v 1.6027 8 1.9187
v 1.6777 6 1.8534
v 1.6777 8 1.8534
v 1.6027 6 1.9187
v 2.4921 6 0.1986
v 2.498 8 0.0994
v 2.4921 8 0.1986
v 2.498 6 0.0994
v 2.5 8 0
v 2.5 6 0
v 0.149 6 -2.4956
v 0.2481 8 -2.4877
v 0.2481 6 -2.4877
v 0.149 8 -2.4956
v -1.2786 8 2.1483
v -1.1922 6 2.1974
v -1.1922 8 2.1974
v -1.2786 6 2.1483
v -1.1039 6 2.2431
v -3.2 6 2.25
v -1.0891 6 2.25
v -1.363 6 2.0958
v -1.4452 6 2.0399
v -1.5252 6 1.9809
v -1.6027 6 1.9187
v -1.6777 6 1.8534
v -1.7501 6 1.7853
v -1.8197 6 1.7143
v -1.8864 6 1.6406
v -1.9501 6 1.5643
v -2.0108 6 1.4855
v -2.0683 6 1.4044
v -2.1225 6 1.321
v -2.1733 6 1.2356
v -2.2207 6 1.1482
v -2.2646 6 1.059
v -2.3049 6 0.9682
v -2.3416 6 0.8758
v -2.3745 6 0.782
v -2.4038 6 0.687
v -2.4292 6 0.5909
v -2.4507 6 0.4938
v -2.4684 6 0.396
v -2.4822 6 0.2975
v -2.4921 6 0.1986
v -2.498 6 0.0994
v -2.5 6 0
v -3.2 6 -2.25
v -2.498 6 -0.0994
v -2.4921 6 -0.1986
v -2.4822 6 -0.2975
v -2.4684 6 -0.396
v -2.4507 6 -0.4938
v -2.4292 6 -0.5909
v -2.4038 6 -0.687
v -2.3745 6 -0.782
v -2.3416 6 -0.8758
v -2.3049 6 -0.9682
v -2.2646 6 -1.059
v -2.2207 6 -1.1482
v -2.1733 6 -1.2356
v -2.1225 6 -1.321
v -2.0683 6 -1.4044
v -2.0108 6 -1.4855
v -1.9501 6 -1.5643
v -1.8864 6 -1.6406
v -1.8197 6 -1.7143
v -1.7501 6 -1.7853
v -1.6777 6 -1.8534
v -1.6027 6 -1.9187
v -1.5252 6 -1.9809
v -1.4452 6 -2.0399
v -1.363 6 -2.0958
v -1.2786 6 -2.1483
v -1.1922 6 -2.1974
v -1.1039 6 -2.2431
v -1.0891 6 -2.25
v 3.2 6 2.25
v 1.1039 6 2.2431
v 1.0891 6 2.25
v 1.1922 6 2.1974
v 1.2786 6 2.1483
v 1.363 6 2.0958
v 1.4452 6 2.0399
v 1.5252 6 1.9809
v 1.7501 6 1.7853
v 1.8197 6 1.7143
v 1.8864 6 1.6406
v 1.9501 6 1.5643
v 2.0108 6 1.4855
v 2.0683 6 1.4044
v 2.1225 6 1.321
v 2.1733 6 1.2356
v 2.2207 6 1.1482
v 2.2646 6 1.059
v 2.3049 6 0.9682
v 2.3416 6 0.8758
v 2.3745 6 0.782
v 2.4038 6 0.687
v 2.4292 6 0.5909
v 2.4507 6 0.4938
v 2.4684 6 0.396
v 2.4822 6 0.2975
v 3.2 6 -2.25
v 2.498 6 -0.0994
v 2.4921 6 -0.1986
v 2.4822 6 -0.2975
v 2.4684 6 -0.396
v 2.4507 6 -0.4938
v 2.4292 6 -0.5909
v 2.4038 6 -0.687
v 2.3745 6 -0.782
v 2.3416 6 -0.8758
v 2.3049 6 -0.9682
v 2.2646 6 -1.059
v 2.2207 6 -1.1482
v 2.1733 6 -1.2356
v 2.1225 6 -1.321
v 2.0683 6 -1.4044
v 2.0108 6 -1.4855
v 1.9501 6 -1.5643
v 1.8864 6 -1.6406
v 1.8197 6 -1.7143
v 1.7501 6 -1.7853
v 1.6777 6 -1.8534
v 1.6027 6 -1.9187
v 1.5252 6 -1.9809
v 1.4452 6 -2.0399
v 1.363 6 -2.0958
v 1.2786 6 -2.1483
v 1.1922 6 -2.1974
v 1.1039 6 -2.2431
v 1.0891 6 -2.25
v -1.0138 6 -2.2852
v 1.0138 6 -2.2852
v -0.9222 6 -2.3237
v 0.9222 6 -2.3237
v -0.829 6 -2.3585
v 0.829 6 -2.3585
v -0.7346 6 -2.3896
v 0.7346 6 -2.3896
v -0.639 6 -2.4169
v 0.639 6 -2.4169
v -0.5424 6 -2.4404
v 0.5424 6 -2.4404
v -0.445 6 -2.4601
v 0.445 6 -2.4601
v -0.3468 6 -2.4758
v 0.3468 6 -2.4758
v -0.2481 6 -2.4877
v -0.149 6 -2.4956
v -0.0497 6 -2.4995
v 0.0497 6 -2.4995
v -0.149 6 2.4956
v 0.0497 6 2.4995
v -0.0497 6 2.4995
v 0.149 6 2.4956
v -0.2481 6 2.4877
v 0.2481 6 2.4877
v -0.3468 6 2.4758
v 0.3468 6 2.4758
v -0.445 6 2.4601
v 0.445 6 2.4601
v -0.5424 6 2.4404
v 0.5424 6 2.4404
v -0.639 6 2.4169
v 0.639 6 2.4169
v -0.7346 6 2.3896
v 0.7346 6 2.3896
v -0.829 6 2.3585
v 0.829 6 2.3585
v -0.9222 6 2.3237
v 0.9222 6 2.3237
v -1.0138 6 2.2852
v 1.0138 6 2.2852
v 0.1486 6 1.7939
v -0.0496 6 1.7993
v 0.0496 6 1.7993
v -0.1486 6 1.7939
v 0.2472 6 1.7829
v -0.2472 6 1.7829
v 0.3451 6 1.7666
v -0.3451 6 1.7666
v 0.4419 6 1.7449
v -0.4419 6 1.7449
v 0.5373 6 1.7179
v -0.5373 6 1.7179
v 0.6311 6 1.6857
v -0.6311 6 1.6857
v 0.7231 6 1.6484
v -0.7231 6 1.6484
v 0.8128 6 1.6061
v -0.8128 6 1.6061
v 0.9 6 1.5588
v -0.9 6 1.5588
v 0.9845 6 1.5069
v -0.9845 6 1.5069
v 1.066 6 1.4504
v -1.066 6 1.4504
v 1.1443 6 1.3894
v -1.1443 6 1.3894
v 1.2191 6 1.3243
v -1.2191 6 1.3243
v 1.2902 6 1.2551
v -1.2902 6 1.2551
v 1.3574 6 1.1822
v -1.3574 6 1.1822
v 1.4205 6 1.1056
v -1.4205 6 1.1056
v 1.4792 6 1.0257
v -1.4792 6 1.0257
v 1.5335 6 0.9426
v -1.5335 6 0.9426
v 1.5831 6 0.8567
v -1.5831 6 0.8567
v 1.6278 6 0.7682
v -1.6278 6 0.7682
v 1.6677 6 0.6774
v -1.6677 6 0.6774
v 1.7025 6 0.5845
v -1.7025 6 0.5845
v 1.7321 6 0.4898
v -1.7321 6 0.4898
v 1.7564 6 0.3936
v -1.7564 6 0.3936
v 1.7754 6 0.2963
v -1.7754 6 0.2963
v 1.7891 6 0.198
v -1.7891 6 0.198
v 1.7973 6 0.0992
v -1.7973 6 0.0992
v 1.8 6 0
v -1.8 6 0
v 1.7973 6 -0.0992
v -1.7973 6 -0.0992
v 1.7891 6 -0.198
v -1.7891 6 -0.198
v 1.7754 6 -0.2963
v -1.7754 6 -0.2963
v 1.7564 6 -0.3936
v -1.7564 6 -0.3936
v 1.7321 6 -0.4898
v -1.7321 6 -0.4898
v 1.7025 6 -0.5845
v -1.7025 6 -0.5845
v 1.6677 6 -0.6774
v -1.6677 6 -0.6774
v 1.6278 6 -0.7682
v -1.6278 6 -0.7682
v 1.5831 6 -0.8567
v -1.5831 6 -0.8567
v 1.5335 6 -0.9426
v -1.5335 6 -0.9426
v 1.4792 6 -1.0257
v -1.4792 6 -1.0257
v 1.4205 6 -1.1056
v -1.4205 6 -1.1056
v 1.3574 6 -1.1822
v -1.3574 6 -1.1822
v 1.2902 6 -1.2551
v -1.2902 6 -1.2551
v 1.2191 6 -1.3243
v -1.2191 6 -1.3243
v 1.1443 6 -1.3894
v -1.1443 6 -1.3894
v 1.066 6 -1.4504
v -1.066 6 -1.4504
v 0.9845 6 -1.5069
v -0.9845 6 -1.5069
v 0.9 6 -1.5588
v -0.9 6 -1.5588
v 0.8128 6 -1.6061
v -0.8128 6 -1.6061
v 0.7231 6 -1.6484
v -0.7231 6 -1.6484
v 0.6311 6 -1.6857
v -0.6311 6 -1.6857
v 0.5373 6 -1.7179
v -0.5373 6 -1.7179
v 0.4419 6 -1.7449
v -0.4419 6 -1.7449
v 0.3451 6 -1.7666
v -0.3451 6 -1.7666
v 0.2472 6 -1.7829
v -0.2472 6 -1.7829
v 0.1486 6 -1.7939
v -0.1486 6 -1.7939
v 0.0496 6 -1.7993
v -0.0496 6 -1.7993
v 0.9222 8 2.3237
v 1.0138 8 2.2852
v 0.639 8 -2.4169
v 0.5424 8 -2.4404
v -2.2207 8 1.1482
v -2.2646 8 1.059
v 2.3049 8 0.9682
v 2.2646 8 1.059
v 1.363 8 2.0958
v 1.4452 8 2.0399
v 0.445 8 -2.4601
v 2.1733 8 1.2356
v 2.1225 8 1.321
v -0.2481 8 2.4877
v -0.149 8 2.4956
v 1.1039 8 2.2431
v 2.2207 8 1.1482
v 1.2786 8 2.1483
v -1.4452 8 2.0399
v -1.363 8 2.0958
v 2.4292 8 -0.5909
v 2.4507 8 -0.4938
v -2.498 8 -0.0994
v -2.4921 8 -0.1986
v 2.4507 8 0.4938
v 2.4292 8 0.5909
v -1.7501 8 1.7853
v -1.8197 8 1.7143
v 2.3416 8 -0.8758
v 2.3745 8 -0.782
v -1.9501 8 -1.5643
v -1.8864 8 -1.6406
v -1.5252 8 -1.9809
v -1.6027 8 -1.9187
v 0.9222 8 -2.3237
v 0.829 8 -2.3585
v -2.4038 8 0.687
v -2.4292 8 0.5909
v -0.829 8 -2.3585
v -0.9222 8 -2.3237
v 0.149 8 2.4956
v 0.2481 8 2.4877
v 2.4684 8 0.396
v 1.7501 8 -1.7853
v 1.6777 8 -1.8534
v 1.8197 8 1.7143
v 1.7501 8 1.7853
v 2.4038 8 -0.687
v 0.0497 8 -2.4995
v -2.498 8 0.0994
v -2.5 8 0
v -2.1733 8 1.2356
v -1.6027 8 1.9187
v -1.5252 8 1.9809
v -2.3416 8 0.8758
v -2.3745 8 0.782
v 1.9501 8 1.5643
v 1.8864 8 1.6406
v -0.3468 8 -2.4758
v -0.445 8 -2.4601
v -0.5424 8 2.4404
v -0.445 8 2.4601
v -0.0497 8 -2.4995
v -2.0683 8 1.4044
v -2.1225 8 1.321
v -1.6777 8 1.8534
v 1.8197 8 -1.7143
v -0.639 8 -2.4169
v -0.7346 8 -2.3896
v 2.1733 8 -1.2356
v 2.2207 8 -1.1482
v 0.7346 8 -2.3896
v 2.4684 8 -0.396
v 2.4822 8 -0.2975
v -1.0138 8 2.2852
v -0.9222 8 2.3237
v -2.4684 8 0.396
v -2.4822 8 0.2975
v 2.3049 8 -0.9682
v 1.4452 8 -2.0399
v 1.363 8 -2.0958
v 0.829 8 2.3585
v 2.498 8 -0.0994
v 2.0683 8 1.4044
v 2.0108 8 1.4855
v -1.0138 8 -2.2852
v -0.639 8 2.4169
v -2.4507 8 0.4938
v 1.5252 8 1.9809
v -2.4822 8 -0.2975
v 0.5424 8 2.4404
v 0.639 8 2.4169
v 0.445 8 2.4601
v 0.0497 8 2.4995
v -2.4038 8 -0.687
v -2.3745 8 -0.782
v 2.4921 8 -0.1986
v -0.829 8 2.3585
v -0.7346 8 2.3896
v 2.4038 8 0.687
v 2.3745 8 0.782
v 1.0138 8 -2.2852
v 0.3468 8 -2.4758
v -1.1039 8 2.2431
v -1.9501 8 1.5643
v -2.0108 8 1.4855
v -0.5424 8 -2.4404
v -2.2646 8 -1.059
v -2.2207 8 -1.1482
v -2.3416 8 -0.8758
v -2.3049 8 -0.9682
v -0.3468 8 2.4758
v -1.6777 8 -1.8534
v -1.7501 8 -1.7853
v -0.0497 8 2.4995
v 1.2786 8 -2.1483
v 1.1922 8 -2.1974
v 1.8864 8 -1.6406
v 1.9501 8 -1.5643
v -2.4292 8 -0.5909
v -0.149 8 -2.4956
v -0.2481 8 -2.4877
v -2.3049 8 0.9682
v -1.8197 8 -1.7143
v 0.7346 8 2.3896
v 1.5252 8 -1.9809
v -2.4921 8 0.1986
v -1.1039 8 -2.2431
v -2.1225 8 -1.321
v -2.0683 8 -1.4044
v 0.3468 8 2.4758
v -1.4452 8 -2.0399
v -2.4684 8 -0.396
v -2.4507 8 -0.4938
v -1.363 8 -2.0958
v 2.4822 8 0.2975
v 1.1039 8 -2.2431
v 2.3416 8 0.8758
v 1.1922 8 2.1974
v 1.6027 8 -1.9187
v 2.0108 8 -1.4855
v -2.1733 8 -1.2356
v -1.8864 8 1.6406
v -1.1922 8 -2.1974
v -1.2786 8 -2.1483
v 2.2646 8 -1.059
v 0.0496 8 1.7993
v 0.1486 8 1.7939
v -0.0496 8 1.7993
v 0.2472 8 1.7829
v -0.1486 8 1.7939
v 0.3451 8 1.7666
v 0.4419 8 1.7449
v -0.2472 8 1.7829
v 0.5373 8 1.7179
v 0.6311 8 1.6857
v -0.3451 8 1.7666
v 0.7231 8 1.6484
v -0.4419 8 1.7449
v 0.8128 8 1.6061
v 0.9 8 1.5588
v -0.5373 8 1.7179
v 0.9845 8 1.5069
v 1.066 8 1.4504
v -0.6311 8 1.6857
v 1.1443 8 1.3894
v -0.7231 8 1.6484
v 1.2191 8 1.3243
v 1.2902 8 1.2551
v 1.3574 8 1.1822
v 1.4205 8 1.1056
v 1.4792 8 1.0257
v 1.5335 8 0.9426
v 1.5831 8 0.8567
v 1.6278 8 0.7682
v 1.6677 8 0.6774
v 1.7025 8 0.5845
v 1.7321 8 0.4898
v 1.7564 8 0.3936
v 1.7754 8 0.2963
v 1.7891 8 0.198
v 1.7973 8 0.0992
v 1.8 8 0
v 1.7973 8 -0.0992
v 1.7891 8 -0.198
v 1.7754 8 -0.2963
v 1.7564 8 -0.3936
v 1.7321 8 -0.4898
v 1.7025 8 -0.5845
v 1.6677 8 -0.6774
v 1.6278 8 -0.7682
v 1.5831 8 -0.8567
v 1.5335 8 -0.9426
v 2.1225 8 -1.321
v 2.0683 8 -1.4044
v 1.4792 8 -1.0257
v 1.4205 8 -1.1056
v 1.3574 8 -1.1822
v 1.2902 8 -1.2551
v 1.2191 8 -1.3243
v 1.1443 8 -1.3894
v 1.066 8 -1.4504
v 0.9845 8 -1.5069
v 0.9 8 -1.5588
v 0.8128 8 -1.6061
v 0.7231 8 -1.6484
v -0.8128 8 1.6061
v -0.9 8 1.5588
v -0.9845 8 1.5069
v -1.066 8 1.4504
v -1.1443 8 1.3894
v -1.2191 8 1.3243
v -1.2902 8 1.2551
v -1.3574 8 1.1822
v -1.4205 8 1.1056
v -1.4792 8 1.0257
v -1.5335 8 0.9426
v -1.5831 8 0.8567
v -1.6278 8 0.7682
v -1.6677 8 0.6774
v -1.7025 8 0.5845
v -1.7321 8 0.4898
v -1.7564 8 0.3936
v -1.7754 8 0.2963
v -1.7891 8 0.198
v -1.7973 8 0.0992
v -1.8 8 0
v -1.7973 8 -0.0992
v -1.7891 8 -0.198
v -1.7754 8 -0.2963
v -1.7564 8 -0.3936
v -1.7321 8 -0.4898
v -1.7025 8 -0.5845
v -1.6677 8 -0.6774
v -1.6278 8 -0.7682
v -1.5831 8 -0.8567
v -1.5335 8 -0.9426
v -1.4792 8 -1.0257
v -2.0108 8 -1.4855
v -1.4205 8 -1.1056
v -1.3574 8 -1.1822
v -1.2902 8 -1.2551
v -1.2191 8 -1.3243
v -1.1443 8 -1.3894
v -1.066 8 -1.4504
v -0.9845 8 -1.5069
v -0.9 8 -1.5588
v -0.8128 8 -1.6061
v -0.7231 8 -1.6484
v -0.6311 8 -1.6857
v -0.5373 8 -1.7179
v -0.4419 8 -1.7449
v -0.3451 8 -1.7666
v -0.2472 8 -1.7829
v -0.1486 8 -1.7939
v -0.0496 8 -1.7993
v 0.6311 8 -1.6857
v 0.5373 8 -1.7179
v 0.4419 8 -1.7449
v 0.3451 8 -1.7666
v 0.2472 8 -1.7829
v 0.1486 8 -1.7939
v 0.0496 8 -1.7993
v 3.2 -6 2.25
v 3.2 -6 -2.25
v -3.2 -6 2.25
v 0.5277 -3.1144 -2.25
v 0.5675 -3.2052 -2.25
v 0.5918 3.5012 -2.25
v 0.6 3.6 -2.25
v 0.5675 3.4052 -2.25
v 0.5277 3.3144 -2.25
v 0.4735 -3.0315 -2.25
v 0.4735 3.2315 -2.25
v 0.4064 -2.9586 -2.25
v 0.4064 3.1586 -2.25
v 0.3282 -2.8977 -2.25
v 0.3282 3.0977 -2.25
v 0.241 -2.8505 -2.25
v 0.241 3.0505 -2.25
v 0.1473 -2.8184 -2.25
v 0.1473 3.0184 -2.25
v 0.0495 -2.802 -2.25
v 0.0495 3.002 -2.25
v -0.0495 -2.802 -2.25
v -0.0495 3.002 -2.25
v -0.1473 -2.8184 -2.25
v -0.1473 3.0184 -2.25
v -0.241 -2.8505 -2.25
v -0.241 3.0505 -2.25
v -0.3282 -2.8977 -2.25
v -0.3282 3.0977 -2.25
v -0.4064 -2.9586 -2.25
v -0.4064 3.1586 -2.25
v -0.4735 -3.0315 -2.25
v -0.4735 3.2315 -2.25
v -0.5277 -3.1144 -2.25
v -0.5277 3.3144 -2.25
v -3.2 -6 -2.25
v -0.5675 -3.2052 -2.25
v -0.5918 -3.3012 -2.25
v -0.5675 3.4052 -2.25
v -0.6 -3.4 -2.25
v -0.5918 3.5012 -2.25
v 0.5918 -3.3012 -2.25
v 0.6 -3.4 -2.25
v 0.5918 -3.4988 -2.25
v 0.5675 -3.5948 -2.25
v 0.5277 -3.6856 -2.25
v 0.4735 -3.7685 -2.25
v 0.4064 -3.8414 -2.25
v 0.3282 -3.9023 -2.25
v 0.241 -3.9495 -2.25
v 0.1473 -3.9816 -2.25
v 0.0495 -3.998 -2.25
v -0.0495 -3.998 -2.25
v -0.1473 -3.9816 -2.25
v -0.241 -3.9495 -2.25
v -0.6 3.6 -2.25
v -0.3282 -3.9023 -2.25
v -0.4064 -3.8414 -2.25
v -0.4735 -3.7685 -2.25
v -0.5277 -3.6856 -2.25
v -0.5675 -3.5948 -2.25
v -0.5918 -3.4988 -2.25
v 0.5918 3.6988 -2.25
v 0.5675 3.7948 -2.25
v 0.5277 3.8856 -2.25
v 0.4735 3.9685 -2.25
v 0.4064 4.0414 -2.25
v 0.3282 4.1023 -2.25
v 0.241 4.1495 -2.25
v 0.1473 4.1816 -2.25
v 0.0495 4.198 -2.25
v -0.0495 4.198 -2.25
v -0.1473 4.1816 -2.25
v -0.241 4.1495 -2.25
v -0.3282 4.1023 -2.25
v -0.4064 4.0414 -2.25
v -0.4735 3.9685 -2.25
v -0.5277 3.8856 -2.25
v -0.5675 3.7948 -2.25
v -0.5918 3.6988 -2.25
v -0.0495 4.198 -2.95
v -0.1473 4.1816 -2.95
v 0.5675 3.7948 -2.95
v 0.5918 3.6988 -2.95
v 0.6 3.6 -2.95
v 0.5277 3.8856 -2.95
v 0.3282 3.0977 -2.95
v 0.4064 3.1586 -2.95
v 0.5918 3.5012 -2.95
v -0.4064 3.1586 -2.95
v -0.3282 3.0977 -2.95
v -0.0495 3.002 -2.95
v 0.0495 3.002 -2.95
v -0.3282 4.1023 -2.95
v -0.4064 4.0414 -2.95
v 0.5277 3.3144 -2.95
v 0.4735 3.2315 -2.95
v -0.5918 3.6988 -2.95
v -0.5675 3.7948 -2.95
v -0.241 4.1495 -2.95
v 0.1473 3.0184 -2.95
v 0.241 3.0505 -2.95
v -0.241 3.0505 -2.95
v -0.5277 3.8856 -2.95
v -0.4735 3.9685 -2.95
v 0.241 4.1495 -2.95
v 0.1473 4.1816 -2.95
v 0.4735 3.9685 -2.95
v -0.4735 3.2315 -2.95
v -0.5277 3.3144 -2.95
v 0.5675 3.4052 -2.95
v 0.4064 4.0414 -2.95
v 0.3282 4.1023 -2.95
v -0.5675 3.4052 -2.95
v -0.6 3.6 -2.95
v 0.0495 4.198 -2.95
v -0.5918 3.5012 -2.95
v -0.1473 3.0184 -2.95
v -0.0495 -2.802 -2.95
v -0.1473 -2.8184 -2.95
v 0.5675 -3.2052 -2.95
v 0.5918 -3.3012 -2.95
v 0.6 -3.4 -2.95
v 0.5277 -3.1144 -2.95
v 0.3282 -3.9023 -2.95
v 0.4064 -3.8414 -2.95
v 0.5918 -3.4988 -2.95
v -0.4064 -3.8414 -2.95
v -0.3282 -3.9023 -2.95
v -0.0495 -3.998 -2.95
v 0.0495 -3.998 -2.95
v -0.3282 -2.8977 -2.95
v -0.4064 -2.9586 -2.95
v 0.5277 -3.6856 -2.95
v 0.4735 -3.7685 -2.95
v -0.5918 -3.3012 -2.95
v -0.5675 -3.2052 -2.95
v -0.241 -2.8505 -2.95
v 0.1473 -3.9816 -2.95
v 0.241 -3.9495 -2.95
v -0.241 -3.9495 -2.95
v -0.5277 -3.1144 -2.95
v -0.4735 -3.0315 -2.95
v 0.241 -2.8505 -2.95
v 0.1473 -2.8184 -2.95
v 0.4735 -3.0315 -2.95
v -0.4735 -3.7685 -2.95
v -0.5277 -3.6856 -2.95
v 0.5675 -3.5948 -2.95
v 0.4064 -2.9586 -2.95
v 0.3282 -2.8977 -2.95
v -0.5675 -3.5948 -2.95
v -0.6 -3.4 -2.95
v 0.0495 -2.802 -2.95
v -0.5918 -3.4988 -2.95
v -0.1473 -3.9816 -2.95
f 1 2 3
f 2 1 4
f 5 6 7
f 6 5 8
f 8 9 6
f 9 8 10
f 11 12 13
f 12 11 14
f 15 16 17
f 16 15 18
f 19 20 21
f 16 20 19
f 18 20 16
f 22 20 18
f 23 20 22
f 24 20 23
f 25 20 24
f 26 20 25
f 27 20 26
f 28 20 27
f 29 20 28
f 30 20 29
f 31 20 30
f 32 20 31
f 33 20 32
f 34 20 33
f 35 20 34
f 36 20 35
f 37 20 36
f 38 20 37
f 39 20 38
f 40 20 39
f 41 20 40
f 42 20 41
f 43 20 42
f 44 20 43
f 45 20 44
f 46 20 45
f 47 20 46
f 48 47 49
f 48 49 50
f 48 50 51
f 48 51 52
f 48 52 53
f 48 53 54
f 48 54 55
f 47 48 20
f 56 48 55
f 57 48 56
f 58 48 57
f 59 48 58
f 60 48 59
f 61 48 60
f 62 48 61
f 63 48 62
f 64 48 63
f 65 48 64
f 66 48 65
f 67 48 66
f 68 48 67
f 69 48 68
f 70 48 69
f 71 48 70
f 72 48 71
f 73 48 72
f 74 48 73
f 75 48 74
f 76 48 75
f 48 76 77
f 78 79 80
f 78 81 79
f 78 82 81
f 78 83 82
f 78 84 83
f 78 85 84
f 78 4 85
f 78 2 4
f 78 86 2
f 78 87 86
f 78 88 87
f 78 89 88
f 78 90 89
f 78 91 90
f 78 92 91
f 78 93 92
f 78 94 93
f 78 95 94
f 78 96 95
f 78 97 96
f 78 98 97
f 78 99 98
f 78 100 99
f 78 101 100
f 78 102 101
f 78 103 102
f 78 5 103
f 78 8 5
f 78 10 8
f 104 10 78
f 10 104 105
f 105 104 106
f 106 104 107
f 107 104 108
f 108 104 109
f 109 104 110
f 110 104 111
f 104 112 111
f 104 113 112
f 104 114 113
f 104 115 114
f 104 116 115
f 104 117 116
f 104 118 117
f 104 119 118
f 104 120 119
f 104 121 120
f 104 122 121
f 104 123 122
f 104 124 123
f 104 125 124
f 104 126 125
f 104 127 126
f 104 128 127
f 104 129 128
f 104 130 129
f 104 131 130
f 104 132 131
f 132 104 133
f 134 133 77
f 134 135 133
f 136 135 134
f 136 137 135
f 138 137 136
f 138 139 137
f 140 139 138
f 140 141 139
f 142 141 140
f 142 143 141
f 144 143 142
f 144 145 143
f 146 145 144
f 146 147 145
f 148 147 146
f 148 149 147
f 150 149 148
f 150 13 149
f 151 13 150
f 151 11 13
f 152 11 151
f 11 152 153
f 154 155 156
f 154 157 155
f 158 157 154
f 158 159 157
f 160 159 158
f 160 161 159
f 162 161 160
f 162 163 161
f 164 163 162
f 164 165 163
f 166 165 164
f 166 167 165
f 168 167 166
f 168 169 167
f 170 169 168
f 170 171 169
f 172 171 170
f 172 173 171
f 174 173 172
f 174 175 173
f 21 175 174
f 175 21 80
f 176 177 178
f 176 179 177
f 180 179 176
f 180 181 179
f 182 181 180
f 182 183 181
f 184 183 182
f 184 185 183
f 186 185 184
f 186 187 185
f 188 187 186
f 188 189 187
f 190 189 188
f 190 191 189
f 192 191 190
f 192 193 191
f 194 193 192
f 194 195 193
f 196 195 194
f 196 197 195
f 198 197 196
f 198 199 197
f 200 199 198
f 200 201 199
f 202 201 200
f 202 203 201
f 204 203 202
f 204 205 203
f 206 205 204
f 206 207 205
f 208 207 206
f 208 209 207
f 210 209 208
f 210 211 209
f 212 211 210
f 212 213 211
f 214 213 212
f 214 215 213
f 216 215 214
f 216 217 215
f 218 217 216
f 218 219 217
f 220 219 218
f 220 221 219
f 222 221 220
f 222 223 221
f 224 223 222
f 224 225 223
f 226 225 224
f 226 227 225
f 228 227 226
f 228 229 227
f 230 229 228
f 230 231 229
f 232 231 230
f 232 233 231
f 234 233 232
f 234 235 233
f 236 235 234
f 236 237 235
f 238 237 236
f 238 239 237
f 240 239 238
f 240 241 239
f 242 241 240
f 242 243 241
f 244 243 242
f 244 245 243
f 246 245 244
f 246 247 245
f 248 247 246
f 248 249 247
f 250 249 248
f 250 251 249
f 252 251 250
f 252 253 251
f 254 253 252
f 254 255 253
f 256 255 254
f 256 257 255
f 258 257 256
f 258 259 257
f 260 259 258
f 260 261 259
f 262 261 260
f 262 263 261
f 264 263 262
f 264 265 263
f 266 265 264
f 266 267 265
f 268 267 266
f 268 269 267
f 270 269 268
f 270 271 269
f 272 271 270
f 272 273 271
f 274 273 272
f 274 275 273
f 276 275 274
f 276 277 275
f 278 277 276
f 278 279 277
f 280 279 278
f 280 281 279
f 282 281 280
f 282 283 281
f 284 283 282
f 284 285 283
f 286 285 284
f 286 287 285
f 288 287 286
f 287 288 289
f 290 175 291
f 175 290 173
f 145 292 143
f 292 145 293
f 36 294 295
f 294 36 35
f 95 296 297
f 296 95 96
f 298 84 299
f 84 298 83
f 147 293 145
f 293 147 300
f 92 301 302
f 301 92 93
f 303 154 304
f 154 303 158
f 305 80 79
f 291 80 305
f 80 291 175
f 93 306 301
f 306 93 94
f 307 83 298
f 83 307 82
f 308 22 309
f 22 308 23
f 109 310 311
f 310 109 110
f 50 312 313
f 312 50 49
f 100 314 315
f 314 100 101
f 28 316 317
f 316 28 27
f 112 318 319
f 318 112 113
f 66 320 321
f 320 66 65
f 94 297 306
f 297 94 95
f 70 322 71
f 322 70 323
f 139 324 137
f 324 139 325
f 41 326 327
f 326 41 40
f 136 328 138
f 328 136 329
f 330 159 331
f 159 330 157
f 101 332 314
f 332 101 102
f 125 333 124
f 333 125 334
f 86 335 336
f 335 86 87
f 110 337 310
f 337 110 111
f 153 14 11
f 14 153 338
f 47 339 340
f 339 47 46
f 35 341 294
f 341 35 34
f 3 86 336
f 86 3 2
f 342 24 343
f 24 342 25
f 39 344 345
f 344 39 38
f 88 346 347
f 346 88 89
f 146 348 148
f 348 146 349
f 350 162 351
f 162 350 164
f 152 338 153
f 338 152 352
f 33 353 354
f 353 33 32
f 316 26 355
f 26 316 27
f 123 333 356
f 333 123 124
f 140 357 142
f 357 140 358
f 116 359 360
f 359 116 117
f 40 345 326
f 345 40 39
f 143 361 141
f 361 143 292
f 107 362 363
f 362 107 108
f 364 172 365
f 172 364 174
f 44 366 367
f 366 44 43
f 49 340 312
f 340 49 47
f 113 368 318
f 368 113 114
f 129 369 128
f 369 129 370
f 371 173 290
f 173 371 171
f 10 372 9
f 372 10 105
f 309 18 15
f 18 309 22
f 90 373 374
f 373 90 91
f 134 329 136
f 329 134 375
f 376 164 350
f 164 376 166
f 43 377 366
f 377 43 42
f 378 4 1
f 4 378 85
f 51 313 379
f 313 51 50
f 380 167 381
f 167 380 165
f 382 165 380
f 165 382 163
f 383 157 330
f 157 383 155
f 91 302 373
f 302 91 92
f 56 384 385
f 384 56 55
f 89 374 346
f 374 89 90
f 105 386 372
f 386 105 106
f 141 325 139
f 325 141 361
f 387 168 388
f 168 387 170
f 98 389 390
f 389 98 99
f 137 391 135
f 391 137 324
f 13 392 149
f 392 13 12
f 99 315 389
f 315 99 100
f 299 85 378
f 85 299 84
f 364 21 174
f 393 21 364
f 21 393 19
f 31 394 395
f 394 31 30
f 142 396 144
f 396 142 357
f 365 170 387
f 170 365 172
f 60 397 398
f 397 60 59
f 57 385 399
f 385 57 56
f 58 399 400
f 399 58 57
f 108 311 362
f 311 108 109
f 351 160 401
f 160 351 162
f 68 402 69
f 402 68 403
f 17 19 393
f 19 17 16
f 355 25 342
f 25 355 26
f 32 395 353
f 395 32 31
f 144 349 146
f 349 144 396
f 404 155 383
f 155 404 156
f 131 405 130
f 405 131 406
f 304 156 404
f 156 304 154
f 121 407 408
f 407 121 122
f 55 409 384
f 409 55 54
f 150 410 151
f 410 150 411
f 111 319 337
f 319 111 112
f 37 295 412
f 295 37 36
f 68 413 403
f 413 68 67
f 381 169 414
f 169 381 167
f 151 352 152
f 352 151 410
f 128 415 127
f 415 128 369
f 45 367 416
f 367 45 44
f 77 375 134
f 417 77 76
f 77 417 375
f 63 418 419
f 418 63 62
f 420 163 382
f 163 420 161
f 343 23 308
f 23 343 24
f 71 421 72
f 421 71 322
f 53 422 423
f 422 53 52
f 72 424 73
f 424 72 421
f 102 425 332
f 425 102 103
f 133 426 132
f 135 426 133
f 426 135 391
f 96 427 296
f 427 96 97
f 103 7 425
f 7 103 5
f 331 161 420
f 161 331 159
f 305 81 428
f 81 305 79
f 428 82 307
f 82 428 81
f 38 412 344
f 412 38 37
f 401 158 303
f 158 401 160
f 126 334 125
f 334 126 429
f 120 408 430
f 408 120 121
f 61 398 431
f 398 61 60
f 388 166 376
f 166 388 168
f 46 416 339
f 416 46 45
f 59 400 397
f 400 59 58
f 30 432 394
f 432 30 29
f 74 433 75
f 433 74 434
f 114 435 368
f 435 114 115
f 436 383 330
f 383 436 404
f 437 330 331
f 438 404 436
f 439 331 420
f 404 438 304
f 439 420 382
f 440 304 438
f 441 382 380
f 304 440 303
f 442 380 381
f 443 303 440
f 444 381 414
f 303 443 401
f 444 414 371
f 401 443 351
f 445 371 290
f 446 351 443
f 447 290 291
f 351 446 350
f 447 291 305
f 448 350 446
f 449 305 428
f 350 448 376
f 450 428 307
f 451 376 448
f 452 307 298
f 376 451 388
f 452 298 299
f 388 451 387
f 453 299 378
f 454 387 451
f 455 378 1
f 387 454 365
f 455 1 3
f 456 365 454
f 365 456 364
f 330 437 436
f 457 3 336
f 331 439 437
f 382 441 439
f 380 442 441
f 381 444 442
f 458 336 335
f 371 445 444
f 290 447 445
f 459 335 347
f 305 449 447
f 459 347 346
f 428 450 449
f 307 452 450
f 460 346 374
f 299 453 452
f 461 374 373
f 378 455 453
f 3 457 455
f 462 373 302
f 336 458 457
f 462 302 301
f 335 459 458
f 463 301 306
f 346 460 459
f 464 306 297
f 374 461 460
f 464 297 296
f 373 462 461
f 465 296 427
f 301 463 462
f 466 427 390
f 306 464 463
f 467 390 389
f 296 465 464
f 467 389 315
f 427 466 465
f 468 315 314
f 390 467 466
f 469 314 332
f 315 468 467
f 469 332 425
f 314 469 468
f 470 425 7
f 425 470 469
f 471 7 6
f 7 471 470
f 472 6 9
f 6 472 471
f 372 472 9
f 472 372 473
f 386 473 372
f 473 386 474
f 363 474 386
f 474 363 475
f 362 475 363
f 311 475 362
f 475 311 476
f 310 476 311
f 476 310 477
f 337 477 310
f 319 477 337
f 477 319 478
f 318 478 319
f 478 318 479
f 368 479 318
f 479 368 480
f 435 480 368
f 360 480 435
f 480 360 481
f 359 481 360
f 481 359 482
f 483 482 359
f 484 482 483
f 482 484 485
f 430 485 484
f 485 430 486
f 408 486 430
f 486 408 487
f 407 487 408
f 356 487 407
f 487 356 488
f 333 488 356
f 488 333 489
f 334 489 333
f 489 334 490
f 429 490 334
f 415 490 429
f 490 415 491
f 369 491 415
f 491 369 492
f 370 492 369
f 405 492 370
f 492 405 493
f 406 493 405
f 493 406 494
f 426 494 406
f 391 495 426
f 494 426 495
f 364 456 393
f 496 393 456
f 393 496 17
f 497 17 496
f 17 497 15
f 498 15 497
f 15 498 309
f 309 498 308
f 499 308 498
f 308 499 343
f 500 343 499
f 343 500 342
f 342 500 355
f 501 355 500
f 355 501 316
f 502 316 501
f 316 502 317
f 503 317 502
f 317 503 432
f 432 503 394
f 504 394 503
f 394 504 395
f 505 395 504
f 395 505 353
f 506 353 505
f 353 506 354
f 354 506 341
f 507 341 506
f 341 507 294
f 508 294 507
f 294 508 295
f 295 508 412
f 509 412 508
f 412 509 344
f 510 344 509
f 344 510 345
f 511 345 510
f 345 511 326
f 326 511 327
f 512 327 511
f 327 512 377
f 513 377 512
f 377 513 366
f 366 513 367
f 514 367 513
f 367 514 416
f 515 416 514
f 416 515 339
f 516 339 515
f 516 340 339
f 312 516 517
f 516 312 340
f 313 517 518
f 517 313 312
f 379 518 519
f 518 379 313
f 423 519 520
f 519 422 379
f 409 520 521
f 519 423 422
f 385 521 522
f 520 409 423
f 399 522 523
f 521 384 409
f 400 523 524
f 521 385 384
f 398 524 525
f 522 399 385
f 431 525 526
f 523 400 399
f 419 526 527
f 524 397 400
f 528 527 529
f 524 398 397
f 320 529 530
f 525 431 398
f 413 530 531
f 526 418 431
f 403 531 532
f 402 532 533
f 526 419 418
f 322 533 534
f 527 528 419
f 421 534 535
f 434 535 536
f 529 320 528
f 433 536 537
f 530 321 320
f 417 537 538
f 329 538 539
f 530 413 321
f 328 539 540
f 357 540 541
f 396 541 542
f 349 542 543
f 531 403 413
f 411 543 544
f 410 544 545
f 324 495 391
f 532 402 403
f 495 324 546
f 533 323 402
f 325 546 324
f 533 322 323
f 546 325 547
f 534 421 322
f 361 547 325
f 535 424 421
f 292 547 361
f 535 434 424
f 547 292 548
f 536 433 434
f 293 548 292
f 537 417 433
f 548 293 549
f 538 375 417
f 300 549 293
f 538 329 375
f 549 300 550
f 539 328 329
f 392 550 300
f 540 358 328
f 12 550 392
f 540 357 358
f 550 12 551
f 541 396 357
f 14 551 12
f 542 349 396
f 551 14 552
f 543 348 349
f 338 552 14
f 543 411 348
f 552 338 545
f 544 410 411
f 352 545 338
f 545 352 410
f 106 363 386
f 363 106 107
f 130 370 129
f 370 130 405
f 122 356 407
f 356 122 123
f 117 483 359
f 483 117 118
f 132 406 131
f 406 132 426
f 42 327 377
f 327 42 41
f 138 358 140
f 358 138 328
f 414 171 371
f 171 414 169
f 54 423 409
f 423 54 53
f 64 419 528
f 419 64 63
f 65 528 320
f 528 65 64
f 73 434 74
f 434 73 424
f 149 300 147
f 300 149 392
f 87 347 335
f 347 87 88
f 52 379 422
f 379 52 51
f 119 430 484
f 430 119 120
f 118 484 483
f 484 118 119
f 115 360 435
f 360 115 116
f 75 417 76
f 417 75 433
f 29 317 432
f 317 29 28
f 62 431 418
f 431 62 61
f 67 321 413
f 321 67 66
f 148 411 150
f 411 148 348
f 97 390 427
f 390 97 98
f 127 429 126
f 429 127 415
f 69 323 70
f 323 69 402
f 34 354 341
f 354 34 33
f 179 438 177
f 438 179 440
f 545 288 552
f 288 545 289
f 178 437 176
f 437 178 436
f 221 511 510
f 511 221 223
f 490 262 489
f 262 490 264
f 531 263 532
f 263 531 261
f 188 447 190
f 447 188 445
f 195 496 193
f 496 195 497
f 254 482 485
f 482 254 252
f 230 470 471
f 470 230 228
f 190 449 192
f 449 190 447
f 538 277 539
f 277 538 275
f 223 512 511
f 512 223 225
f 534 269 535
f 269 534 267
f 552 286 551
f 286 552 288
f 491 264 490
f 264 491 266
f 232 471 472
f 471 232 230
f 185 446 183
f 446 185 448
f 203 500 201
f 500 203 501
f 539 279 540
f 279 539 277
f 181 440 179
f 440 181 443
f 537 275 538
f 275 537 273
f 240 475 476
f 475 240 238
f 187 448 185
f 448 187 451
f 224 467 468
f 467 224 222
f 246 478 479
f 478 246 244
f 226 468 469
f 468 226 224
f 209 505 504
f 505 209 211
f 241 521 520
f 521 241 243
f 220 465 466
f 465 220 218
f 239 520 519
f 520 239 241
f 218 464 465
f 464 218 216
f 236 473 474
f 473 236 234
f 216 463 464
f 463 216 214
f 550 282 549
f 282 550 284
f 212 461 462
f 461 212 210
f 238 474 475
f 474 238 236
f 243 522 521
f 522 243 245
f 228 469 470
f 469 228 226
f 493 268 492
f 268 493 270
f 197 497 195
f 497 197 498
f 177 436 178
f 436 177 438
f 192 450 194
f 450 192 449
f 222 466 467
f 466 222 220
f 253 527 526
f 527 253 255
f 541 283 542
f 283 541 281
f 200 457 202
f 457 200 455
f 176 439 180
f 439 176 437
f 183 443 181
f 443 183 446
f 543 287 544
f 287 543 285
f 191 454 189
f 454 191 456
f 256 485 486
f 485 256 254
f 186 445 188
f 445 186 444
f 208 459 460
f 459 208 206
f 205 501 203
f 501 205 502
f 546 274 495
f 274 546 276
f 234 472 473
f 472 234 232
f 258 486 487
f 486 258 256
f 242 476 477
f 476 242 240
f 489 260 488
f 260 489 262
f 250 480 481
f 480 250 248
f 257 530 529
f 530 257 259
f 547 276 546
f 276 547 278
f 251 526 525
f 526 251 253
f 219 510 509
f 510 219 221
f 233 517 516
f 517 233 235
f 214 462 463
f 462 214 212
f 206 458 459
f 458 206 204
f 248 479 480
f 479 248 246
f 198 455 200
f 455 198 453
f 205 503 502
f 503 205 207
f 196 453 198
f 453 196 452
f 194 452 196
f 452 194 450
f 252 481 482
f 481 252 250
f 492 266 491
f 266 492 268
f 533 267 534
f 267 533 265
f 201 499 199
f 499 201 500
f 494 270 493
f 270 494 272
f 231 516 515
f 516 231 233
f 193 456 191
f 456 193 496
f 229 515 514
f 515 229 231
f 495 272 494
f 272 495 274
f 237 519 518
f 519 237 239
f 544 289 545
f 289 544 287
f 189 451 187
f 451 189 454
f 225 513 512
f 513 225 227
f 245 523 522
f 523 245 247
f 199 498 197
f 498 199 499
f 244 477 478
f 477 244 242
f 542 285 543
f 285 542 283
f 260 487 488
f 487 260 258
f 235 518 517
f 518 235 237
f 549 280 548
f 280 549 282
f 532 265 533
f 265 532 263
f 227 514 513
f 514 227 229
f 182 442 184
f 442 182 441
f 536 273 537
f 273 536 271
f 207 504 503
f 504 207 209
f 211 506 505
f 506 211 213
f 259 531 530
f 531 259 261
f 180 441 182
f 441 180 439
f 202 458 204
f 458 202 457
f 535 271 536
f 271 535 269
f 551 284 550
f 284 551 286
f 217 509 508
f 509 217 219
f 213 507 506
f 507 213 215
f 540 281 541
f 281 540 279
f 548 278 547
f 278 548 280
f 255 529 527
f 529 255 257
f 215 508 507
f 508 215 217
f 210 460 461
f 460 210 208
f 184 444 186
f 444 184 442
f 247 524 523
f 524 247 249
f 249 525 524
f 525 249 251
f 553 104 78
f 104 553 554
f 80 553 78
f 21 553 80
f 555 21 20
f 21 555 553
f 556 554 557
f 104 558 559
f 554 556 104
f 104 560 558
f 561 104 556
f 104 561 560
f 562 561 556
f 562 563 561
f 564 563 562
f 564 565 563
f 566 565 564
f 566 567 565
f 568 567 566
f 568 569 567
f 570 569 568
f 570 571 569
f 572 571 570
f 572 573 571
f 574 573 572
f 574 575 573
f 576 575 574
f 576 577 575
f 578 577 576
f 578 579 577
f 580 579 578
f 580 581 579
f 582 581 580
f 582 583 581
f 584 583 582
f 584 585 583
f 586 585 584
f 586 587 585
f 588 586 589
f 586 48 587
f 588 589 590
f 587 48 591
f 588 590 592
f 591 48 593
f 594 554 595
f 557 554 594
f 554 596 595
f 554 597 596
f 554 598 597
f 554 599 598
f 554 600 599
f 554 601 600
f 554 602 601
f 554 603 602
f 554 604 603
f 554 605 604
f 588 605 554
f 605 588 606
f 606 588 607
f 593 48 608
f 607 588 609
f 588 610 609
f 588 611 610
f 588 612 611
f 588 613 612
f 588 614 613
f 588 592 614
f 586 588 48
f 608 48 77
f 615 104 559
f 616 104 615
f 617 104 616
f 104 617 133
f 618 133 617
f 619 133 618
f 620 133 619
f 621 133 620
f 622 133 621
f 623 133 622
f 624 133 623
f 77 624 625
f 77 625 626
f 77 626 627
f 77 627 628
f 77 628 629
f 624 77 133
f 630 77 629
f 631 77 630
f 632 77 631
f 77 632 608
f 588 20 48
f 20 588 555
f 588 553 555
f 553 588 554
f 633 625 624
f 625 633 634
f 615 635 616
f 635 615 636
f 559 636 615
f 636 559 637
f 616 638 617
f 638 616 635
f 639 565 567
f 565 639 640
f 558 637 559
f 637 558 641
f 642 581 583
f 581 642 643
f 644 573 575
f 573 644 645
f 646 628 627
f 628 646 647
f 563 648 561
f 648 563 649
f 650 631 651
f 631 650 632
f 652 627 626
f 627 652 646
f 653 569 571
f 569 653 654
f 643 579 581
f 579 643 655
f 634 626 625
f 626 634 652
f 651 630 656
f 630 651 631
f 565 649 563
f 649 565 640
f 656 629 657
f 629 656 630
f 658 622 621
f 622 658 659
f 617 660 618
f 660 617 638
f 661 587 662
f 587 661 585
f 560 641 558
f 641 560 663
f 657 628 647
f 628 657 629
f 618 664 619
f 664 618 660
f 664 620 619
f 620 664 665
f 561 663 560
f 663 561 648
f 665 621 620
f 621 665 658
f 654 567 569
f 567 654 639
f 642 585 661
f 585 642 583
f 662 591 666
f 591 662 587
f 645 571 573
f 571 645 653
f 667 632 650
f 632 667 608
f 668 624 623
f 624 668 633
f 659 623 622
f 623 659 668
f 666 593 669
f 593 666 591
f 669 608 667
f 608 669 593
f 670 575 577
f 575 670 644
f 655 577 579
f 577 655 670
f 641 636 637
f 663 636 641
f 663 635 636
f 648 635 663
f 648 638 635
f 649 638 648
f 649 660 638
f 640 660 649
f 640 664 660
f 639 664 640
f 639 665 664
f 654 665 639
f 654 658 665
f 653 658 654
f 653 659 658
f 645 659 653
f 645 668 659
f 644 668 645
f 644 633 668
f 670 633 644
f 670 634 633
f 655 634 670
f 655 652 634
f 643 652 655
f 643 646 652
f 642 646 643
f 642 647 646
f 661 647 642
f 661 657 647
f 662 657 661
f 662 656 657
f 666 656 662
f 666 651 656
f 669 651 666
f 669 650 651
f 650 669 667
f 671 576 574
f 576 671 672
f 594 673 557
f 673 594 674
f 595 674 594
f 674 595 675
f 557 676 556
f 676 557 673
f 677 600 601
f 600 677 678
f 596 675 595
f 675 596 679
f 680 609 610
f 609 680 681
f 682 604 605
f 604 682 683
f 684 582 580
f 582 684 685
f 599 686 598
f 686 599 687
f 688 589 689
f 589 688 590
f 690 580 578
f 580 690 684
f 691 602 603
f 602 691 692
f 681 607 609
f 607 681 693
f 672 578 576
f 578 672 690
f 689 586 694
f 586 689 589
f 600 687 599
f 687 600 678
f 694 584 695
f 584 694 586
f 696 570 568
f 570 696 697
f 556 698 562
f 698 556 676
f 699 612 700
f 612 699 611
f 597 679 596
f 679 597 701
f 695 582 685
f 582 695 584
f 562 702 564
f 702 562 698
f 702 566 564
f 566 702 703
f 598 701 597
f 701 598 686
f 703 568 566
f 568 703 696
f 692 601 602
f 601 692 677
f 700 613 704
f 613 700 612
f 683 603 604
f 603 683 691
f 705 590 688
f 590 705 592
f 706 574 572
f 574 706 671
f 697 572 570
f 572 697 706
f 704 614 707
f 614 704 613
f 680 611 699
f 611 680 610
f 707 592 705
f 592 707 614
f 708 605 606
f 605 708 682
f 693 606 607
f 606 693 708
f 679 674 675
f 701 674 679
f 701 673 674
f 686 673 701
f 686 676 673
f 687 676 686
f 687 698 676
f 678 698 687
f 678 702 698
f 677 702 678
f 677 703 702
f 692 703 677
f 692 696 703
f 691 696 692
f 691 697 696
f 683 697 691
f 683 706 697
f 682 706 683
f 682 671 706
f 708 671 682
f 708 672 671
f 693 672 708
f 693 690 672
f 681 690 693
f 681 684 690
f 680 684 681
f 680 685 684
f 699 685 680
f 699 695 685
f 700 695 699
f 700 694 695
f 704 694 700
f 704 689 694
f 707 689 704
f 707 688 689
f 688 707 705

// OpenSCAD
/*
 * PJ3106.scad - Stereo 3.5mm audio socket
 * 
 * Copyright (C) 2015 Theophilus
 *
 * osab
 *
 * License: Matthew 10:8b - "freely ye have received, freely give."
 *
 * Use this information at your own risk.
 *
 */

$fa=0.1; // default minimum facet angle is now 0.1
$fs=0.1; // default minimum facet size is now 0.1 mm

cube([6.4,12,4.5],center=true);
translate([0,7,0]) rotate([90,0,0]) difference() {
	cylinder(h=2,d=5,center=true);
	cylinder(h=2.1,d=3.6,center=true);
}

translate([0,3.6,-2.6]) cylinder(h=0.7,d=1.2,center=true);
translate([0,-3.4,-2.6]) cylinder(h=0.7,d=1.2,center=true);
